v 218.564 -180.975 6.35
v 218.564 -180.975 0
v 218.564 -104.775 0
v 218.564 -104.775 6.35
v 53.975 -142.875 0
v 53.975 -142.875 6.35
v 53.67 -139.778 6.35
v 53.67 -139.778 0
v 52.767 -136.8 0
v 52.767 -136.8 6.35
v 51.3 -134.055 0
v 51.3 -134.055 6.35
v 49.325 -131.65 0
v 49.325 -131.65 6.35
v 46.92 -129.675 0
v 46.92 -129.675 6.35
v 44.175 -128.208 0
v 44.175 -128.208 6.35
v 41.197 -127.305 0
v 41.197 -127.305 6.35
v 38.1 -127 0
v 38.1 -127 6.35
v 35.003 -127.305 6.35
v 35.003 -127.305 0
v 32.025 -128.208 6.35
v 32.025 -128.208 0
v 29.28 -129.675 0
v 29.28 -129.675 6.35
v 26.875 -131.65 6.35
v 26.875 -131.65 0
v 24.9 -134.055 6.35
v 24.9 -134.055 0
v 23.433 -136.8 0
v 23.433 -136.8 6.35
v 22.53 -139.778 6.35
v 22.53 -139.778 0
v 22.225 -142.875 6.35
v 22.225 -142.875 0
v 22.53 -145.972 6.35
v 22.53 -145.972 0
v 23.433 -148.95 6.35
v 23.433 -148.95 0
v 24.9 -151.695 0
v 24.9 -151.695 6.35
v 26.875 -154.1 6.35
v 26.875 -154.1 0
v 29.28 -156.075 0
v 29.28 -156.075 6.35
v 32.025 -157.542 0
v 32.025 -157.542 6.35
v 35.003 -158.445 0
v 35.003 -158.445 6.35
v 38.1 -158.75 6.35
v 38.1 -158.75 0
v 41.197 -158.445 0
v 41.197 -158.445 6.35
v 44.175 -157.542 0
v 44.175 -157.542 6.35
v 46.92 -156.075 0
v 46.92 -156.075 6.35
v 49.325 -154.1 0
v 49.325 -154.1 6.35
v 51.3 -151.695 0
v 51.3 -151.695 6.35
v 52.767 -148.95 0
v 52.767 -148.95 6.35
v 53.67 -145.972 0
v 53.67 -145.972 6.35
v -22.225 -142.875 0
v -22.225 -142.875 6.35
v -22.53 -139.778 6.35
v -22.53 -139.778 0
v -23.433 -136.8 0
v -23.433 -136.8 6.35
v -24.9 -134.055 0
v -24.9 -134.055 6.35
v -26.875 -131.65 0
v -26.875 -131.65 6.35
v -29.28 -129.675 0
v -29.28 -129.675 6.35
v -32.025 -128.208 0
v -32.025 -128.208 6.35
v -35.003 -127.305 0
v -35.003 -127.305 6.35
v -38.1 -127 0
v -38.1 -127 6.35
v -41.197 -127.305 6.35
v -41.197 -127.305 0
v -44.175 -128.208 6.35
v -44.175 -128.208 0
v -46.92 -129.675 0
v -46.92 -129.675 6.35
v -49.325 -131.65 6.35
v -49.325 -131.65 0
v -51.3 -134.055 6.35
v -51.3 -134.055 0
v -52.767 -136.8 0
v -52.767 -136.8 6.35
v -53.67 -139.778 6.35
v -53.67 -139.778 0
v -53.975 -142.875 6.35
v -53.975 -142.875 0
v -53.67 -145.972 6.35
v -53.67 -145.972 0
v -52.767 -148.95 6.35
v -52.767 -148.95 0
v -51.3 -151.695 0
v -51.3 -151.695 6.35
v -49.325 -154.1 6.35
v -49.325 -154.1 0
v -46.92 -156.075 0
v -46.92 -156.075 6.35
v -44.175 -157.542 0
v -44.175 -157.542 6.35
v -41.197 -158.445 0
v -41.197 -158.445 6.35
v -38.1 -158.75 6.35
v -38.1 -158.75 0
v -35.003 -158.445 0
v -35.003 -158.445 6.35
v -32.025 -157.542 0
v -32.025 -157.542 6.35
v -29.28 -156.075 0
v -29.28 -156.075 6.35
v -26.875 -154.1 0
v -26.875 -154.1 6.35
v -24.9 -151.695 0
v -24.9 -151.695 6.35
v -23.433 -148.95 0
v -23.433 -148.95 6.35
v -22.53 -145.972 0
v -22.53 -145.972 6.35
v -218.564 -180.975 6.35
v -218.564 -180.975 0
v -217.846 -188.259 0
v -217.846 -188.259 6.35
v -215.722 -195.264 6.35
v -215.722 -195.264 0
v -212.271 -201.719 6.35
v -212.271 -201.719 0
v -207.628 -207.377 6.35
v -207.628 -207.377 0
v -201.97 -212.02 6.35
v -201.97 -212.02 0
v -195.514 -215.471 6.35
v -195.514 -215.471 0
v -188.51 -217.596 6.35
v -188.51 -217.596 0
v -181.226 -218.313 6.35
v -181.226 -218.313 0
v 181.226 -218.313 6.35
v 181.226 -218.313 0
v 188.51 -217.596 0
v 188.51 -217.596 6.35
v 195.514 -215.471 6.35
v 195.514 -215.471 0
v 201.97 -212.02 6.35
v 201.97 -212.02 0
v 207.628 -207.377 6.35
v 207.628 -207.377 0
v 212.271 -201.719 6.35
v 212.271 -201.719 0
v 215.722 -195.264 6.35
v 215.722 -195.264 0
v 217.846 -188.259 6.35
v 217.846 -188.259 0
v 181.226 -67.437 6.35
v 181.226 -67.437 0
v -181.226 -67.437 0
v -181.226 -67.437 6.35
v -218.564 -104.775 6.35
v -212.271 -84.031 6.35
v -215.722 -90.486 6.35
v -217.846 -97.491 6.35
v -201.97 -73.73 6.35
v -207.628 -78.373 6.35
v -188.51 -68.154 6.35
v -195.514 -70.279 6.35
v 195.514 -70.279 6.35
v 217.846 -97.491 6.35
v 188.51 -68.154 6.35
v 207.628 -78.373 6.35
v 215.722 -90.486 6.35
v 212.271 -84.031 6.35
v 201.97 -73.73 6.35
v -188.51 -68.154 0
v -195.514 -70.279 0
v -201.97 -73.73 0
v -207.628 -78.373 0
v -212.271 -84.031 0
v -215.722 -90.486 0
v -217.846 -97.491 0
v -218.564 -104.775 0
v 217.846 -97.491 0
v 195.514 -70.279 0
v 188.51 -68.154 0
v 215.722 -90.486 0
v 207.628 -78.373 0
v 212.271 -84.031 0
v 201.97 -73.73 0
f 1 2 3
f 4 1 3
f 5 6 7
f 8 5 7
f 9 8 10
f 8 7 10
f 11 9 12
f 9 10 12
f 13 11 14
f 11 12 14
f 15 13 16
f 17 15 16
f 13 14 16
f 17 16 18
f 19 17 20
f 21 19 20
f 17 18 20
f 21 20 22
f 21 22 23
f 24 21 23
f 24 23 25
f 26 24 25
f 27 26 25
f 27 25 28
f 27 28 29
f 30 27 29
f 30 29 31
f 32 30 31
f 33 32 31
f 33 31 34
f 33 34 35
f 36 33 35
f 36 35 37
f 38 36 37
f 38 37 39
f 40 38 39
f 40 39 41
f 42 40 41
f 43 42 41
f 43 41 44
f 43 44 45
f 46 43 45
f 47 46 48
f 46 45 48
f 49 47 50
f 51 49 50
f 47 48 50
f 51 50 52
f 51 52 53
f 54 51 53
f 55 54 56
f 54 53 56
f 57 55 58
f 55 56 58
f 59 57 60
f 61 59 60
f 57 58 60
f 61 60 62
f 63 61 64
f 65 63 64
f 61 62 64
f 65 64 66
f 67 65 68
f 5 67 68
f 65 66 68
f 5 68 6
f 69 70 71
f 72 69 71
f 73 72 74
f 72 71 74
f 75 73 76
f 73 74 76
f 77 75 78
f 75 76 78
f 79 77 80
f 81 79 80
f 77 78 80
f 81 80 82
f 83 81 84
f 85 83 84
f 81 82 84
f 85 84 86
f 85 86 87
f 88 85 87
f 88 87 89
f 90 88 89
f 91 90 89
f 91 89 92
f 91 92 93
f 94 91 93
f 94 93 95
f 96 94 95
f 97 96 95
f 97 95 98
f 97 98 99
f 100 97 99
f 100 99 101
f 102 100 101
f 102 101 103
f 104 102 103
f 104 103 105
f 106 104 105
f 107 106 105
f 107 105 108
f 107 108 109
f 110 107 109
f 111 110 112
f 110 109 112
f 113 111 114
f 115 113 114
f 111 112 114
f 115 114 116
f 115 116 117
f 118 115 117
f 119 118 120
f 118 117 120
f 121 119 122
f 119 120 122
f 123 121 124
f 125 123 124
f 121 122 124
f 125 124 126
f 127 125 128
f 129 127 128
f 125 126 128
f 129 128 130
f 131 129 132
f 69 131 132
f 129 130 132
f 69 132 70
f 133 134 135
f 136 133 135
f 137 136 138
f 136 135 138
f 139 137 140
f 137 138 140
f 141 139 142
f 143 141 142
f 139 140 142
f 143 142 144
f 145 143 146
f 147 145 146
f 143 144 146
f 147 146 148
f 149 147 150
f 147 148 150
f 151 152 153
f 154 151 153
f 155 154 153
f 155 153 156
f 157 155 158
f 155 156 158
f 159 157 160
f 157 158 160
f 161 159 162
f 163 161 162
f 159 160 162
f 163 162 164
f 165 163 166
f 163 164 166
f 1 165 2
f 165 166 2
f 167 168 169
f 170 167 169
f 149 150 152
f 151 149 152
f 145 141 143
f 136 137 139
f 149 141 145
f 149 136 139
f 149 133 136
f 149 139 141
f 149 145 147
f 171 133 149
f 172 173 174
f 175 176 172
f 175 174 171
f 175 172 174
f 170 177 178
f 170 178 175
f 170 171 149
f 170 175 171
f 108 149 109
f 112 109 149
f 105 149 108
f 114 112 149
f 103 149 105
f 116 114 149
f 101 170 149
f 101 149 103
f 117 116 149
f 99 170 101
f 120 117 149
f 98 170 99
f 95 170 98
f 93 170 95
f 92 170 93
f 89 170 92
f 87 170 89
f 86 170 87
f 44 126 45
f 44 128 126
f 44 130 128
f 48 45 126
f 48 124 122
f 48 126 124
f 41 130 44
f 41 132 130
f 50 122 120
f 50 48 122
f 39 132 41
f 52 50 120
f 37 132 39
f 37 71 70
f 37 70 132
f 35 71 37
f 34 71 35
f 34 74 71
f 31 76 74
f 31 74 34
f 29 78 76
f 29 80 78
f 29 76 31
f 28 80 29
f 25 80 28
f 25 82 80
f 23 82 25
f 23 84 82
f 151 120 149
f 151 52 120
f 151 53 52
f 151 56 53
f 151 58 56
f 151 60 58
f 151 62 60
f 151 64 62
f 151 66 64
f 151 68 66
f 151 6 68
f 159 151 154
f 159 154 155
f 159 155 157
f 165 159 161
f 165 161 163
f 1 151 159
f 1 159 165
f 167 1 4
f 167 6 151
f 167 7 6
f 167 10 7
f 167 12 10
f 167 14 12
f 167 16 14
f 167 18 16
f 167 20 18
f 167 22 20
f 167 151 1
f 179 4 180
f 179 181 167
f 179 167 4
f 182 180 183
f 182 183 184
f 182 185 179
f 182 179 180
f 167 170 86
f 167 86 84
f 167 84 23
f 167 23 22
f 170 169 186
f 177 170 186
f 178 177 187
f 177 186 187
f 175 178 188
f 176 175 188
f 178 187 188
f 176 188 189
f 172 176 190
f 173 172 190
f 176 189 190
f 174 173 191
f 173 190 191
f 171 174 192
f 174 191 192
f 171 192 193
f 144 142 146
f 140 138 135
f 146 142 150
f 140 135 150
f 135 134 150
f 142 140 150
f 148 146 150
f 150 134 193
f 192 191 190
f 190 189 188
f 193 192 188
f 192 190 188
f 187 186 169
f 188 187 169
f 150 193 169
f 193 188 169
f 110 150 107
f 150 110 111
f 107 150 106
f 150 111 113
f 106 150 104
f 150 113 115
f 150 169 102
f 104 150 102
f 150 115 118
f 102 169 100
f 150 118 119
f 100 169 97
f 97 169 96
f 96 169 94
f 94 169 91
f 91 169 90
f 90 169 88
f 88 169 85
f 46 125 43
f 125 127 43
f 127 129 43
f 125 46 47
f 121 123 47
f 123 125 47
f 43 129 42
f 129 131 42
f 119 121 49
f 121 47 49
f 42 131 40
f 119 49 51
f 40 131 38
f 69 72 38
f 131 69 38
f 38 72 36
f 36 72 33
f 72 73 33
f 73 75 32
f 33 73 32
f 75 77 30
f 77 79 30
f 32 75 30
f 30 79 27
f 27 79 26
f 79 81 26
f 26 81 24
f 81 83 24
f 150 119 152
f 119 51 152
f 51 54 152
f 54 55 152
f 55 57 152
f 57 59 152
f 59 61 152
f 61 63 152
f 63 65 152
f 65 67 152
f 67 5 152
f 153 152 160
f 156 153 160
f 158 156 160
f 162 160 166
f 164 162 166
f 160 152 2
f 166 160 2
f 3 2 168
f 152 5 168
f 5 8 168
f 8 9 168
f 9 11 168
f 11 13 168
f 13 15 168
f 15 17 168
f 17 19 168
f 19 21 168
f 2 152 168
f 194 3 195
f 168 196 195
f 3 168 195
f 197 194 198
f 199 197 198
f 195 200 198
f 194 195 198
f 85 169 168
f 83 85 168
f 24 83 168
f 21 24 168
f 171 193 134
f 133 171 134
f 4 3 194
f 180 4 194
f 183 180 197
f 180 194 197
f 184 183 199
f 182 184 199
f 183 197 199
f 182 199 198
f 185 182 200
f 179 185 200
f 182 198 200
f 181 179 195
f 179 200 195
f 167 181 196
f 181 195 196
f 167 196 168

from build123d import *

# Parameters (mm, degrees)
BOSS_EXTRUDE1_DEPTH = 6.35
CUT_EXTRUDE1_REACH  = 310.984
SKETCH3_R           = 15.875


with BuildPart() as part:
    # Sketch2 → Boss-Extrude1 (new body)
    with BuildSketch(Plane.XY):
        with BuildLine():
            Line((218.563766336, -180.975), (218.563766336, -104.775))
            ThreePointArc((218.563766336, -104.775), (207.627719332, -78.373047004), (181.225766336, -67.437))
            Line((181.225766336, -67.437), (-181.225766336, -67.437))
            ThreePointArc((-181.225766336, -67.437), (-207.627719332, -78.373047004), (-218.563766336, -104.775))
            Line((-218.563766336, -104.775), (-218.563766336, -180.975))
            ThreePointArc((-218.563766336, -180.975), (-207.627719332, -207.376952996), (-181.225766336, -218.313))
            Line((-181.225766336, -218.313), (181.225766336, -218.313))
            ThreePointArc((181.225766336, -218.313), (207.627719332, -207.376952996), (218.563766336, -180.975))
        make_face()
    extrude(amount=BOSS_EXTRUDE1_DEPTH)

    # Sketch3 → Cut-Extrude1 (cut, up to next)
    with BuildSketch(Plane.XY.offset(6.35), mode=Mode.PRIVATE) as cut_extrude1_sk1:
        with Locations((-38.1, -142.875)):
            Circle(SKETCH3_R)
    cut_extrude1_tool1 = extrude(cut_extrude1_sk1.sketch, amount=-CUT_EXTRUDE1_REACH, mode=Mode.PRIVATE) & part.part
    # Sketch3 → Cut-Extrude1 (cut, up to next)
    with BuildSketch(Plane.XY.offset(6.35), mode=Mode.PRIVATE) as cut_extrude1_sk2:
        with Locations((38.1, -142.875)):
            Circle(SKETCH3_R)
    cut_extrude1_tool2 = extrude(cut_extrude1_sk2.sketch, amount=-CUT_EXTRUDE1_REACH, mode=Mode.PRIVATE) & part.part
    add(cut_extrude1_tool1.solids().sort_by_distance((-38.1, -142.875, 6.35))[0], mode=Mode.SUBTRACT)
    add(cut_extrude1_tool2.solids().sort_by_distance((38.1, -142.875, 6.35))[0], mode=Mode.SUBTRACT)


solid = part.part
